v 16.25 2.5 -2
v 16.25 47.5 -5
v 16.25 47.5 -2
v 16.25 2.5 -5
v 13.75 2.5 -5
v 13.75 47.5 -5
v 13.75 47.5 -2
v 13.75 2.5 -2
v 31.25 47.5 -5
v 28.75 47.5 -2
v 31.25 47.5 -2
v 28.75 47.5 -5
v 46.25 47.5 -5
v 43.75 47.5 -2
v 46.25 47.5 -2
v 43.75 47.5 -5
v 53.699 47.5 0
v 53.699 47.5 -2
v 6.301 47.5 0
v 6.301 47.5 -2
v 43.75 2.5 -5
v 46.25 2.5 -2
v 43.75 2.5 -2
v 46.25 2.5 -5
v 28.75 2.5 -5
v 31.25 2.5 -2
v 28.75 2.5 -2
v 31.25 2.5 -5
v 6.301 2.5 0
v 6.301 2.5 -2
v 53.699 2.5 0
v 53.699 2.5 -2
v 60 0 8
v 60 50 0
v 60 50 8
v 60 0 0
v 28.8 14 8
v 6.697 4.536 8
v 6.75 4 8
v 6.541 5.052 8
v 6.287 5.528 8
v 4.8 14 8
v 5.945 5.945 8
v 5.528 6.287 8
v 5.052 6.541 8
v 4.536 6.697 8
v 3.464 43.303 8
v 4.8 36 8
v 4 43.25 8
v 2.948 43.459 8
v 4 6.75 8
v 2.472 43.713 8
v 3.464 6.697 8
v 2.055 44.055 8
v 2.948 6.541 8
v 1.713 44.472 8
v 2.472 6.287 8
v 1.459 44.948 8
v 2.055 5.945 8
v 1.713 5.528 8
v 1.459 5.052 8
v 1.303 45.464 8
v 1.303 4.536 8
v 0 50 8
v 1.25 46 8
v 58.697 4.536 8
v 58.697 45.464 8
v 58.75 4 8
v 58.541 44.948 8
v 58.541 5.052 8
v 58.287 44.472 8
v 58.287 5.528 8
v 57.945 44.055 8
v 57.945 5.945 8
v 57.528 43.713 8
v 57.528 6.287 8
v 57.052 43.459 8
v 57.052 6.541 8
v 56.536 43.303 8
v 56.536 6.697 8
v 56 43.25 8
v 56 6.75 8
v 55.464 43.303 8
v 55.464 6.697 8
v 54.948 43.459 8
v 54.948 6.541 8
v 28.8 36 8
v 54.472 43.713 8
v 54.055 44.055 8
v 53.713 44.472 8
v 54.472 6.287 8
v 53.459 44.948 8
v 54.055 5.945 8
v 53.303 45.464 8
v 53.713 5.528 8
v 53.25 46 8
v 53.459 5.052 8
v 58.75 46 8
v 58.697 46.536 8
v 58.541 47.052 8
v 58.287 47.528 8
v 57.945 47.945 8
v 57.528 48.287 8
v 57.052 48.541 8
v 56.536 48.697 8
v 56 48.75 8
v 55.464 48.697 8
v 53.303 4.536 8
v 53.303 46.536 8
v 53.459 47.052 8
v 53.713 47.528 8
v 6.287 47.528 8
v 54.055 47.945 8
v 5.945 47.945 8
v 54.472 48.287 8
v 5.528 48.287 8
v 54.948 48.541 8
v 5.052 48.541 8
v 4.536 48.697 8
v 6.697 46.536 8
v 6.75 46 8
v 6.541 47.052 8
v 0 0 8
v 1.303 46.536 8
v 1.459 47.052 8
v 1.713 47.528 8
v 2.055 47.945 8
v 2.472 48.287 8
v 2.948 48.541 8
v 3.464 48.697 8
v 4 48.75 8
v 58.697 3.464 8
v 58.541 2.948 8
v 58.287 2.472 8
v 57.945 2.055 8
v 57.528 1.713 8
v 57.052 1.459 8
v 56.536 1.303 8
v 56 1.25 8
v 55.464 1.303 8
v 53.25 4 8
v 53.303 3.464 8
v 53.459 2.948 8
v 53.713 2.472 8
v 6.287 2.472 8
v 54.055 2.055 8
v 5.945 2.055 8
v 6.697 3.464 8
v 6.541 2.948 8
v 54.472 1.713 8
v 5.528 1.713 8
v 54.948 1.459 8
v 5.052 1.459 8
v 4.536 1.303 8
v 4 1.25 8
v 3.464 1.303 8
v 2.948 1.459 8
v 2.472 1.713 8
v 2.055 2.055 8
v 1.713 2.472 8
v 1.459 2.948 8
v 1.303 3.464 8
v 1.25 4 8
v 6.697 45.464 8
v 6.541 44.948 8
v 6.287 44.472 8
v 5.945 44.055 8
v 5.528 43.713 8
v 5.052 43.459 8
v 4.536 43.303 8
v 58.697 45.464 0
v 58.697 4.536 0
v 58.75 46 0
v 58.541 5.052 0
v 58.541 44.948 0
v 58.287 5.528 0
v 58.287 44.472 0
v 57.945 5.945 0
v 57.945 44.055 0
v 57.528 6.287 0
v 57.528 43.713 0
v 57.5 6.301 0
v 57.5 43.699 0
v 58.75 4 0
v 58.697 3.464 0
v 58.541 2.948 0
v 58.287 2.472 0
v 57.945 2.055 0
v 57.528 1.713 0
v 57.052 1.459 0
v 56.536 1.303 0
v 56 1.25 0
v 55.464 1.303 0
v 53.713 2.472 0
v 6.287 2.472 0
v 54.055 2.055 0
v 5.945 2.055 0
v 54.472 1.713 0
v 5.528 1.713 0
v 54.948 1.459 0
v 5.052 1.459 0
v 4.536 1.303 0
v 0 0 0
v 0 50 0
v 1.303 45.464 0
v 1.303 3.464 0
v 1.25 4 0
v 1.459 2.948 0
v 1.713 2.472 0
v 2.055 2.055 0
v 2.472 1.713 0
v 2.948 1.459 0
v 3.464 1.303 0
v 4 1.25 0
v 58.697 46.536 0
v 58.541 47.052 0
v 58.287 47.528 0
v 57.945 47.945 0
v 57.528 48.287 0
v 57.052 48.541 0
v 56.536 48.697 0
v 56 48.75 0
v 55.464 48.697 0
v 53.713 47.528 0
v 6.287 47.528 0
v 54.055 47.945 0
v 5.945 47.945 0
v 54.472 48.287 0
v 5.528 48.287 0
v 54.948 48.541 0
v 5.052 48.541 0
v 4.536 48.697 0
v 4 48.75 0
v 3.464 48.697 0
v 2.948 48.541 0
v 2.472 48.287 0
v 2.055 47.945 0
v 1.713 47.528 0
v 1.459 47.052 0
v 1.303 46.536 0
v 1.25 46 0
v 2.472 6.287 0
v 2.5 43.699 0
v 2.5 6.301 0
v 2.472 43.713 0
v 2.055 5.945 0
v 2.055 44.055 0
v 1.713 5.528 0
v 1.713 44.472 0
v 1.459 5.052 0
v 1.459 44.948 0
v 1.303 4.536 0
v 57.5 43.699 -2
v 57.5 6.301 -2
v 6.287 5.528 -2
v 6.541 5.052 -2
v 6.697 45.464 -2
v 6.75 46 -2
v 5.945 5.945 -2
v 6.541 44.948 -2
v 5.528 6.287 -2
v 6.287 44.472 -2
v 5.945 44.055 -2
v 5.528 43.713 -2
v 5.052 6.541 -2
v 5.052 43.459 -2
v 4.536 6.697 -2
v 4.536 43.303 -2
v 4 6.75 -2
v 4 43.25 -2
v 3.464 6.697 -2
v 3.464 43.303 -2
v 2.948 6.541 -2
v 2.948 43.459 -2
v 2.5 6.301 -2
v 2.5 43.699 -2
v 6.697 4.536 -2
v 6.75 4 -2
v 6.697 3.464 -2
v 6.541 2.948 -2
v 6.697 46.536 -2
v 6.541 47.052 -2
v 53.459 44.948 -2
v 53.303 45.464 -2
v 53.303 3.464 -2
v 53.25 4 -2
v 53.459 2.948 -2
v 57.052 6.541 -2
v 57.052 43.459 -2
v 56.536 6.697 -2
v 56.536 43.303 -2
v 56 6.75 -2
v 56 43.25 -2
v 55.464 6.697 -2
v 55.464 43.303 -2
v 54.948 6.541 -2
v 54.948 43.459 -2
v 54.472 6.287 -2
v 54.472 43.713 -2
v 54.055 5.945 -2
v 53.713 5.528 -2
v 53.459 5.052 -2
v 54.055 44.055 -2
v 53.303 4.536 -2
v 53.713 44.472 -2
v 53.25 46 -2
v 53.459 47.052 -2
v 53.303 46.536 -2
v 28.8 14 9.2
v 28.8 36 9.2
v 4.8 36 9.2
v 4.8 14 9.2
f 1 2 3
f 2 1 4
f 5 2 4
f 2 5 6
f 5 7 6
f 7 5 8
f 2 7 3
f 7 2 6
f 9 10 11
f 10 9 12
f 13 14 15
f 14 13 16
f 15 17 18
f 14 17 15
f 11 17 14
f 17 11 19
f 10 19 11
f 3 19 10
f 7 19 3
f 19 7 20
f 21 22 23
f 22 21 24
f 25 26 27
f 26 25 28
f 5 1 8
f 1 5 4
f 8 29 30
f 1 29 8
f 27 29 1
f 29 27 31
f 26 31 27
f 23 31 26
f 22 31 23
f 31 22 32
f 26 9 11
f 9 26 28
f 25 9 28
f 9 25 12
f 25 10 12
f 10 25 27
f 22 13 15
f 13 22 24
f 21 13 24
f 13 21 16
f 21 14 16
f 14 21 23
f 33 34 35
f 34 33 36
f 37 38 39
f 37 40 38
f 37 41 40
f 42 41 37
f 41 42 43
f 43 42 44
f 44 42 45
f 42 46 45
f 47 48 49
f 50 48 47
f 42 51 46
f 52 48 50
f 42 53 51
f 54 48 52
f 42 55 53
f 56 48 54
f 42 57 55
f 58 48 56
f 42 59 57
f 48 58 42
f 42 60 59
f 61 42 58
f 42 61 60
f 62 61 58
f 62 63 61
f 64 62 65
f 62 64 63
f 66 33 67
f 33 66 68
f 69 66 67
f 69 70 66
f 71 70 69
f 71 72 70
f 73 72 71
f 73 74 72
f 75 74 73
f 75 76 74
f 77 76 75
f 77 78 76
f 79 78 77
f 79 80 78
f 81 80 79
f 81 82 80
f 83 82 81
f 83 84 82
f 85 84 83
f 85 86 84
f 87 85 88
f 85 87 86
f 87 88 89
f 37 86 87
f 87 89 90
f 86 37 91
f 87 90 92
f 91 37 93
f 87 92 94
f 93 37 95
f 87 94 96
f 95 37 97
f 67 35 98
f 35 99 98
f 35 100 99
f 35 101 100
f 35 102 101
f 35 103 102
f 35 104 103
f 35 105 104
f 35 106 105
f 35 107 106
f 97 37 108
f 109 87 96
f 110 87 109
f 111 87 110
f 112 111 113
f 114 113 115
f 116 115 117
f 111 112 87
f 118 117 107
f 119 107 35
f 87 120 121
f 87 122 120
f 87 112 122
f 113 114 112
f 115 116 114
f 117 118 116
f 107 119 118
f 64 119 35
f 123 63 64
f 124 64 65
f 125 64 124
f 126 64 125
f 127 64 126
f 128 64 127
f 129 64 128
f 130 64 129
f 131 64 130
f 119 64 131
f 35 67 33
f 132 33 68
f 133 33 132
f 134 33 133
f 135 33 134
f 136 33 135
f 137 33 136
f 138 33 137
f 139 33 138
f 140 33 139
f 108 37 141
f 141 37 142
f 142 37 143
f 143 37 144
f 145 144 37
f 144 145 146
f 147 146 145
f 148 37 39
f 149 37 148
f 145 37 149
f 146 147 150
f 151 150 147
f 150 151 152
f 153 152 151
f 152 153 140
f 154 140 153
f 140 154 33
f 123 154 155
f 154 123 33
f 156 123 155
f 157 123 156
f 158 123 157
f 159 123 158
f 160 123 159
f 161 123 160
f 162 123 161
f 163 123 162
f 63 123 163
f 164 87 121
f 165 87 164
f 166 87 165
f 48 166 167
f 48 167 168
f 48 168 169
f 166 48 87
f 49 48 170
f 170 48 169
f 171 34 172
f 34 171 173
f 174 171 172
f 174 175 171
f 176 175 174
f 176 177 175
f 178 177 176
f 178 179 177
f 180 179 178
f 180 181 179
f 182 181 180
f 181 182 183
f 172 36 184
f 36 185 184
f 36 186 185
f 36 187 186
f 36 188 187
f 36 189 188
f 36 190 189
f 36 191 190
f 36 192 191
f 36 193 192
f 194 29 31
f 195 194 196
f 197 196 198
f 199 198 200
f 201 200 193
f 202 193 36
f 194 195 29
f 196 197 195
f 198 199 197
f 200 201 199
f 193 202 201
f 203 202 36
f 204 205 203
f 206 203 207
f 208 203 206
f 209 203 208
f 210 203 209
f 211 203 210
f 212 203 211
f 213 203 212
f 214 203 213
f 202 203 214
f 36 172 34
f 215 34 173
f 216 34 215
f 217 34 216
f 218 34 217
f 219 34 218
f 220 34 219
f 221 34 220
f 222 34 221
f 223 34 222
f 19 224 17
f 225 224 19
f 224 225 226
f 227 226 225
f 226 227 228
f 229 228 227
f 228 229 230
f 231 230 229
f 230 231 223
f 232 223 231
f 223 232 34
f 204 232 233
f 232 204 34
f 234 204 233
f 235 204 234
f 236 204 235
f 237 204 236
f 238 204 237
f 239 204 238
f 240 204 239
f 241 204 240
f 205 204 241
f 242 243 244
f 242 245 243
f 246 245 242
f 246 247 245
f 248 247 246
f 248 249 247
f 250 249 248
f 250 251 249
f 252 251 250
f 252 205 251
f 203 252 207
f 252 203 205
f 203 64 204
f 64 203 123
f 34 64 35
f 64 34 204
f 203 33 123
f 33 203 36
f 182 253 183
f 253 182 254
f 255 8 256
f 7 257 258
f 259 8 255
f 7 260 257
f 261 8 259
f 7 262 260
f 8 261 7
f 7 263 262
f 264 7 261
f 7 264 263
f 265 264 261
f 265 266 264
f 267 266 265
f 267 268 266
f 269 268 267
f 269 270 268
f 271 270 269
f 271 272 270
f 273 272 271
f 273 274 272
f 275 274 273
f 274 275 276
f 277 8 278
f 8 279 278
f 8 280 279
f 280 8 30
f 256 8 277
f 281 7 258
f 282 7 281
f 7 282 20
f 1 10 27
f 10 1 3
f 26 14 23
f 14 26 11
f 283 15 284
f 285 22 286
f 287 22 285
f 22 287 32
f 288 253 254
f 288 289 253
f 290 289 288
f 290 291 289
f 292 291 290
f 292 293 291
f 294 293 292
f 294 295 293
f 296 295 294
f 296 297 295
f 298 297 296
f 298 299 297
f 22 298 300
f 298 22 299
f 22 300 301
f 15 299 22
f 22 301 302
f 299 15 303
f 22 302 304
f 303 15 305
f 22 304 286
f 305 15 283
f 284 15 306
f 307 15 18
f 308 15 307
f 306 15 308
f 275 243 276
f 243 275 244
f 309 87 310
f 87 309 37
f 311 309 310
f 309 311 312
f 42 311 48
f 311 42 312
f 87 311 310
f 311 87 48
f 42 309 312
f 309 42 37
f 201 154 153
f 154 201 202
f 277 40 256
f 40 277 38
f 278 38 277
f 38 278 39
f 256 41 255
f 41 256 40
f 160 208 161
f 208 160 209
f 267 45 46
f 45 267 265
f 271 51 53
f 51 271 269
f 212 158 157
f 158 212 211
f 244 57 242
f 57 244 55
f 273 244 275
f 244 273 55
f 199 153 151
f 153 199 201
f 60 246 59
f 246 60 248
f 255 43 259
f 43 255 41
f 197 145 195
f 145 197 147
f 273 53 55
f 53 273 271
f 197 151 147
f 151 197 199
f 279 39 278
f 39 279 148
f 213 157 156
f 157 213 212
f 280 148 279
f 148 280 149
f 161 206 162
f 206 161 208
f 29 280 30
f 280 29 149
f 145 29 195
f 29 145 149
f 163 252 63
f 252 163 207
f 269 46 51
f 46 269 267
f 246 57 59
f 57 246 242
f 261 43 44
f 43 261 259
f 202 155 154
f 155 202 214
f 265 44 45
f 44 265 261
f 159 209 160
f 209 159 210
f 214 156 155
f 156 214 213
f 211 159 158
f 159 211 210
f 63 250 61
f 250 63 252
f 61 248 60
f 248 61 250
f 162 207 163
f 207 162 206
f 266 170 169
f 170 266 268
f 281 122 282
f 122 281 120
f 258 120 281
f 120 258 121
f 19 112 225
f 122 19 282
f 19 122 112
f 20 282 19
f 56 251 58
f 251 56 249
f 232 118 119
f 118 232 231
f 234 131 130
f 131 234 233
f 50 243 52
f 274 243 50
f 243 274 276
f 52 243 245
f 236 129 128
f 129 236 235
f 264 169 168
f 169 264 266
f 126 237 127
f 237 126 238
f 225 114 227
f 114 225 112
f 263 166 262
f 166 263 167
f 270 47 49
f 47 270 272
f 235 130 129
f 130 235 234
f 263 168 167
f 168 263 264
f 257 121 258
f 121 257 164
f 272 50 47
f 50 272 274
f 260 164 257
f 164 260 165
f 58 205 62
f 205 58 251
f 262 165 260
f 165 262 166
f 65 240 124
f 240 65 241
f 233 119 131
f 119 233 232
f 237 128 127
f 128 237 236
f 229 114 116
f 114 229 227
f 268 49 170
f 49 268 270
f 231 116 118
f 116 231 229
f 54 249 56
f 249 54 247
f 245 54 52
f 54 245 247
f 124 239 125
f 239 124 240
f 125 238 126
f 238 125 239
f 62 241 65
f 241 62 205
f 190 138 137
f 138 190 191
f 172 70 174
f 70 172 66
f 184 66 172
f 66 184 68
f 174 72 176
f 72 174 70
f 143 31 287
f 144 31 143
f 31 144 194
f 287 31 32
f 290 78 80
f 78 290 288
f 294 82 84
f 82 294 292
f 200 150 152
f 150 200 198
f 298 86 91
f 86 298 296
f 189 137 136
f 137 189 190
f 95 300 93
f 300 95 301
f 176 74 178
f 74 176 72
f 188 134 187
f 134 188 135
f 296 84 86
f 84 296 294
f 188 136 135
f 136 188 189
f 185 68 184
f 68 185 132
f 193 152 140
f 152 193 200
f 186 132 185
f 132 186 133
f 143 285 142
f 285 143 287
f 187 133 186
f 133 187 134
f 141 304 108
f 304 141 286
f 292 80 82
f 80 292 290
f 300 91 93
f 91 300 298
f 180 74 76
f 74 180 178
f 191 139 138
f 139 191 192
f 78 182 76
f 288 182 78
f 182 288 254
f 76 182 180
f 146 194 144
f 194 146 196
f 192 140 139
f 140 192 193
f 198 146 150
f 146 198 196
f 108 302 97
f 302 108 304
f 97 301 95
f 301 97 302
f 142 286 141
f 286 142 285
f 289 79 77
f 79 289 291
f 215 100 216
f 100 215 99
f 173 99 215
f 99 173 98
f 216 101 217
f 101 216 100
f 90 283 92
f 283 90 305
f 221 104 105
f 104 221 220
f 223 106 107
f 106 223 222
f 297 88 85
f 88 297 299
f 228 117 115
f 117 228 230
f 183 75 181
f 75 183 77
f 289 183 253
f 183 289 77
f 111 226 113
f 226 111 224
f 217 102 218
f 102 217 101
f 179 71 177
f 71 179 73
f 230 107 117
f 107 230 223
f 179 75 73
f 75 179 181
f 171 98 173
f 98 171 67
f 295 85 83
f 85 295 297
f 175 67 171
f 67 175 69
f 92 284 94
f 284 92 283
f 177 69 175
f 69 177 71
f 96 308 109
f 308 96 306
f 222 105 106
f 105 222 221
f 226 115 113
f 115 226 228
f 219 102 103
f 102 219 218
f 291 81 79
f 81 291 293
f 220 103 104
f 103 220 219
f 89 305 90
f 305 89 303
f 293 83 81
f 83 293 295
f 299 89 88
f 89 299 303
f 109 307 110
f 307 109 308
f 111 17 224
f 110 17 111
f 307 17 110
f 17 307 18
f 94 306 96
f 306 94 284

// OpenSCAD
$fn = 32;

// ----------------------------------------------------------------------
// Enclosure lid: 60 x 50 x 8 mm, 4 bolt holes
// ----------------------------------------------------------------------

// --- parameters (mm) ---
length = 60;              // lid length, X
width = 50;               // lid width, Y
plate_t = 8;              // lid plate thickness
bolt_d = 5.5;             // bolt clearance
boss_lip = 4;             // bolt hole inset from the corner
sink = 1;                 // overlap of the lip and ribs into the plate
lip_h = 3;                // lip height below the plate
lip_wall = 2.5;           // lip wall thickness
rib_n = 3;                // stiffening ribs
rib_t = 2.5;              // rib thickness
rib_h = 6;                // rib height below the plate
label_h = 1.2;            // raised marking pad

module plate() {
  cube([length, width, plate_t]);
  /* lip that drops into the housing opening, sunk into the plate */
  translate([lip_wall, lip_wall, -lip_h + sink]) cube([length - 2 * lip_wall, width - 2 * lip_wall, lip_h]);
  /* stiffening ribs under the plate */
  for (i = [1 : rib_n]) translate([length * i / (rib_n + 1) - rib_t / 2, lip_wall, -rib_h + sink]) cube([rib_t, width - 2 * lip_wall, rib_h]);
  /* raised marking pad on top, sunk 1 mm into the plate */
  translate([length * 0.08, width * 0.28, plate_t - 1]) cube([length * 0.4, width * 0.44, label_h + 1]);
}

difference() {
  plate();
  /* bolt pattern matching the corner bosses */
  for (sx = [0, 1]) for (sy = [0, 1])
    translate([sx * (length - 2 * boss_lip) + boss_lip, sy * (width - 2 * boss_lip) + boss_lip, -lip_h - 1])
      cylinder(h = plate_t + lip_h + 2, d = bolt_d);
}
